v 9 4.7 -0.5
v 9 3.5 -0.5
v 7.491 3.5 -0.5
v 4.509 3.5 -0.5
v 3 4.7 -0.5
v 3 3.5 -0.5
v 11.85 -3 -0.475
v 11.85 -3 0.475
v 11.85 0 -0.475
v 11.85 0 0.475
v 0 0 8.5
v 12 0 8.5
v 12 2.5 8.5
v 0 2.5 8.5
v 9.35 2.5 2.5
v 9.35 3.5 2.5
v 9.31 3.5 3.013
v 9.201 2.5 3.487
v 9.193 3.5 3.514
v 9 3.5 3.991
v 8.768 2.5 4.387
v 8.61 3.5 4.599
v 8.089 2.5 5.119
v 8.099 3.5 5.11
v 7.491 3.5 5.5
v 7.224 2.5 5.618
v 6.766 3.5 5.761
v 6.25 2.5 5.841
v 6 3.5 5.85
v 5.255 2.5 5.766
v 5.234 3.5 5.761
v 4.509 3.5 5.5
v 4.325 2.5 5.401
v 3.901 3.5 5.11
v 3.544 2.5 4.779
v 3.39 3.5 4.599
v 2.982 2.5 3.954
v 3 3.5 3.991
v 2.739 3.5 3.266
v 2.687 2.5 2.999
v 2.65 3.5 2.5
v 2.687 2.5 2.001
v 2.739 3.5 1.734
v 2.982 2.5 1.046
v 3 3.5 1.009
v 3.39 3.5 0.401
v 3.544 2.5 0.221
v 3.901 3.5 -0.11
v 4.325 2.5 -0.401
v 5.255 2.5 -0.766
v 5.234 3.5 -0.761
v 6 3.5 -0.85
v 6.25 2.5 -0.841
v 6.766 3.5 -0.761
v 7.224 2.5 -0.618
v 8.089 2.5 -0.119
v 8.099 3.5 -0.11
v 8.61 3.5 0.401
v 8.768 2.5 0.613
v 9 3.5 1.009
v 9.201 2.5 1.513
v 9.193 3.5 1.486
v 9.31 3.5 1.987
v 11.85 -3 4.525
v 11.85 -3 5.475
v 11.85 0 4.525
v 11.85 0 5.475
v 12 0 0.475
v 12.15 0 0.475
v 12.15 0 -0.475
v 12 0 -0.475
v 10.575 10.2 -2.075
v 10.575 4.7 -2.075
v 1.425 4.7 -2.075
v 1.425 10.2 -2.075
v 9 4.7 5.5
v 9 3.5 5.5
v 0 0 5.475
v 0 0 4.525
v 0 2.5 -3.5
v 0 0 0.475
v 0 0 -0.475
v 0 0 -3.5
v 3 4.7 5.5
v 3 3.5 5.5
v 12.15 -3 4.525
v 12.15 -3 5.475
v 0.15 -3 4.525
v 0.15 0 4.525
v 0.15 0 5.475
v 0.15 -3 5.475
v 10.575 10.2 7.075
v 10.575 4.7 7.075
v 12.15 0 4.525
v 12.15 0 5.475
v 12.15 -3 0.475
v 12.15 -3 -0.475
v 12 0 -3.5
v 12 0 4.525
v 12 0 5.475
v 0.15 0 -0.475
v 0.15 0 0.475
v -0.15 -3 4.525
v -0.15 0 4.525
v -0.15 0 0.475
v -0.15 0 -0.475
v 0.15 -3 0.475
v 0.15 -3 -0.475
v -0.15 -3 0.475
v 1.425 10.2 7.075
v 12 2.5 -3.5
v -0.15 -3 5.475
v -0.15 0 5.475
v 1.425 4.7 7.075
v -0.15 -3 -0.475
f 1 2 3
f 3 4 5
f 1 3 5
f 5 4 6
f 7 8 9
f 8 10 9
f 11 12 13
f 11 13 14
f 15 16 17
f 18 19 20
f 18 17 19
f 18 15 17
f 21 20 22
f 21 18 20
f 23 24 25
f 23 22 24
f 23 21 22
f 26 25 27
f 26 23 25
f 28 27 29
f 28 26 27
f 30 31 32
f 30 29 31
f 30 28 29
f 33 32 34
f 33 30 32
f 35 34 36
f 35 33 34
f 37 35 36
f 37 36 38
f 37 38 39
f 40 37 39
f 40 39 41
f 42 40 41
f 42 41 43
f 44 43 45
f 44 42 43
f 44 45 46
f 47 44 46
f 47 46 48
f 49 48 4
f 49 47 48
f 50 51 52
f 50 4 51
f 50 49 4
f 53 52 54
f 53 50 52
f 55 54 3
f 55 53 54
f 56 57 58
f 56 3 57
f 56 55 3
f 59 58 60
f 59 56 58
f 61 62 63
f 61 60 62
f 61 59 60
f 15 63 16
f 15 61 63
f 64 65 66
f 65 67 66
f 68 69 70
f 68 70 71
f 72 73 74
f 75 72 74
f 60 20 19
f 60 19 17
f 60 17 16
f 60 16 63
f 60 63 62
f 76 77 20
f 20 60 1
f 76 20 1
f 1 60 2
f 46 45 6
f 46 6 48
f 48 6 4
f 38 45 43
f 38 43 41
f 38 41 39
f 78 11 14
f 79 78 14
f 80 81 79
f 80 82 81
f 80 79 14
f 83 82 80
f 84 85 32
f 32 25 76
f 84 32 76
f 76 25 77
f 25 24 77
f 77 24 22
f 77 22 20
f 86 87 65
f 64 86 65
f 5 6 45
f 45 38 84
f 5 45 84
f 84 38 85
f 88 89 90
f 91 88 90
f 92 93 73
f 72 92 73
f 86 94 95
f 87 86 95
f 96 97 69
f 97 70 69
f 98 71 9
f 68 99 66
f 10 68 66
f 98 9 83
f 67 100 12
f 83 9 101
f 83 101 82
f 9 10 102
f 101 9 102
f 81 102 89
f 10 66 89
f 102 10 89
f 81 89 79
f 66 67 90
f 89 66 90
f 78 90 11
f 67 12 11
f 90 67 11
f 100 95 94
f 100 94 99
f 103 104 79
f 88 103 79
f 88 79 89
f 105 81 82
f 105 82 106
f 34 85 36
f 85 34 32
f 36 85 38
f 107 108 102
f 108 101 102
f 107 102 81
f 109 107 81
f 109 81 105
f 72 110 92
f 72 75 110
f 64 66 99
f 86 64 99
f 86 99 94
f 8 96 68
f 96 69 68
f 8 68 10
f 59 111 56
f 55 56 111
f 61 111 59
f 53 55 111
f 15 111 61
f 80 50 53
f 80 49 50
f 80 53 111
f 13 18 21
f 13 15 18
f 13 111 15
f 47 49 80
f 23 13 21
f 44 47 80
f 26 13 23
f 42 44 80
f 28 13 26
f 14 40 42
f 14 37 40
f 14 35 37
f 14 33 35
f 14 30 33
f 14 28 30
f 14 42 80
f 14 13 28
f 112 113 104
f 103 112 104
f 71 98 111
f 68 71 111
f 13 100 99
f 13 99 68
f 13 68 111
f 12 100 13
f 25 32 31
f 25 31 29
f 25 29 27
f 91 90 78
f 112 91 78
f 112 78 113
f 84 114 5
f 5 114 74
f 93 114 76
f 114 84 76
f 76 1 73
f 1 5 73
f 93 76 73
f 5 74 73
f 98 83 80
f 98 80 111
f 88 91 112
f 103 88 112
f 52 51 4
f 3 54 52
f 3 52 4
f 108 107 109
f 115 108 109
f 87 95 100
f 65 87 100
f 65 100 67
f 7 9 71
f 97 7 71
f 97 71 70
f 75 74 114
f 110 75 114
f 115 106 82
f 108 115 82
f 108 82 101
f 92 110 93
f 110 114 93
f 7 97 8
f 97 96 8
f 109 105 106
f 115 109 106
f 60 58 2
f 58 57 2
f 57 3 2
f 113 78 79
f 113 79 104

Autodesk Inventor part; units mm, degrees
ref_plane "YZ Plane" through (0, 0, 0) normal (1, 0, 0) x (0, 1, 0)
ref_plane "XZ Plane" through (0, 0, 0) normal (0, 1, 0) x (-1, 0, 0)
ref_plane "XY Plane" through (0, 0, 0) normal (0, 0, 1) x (1, 0, 0)
sketch "Sketch1" plane through (0, 0, 0) normal (0, 1, 0) x (-1, 0, 0)
  line L0 (-0.15, 0.475) -> (0.15, 0.475)
  line L1 (0.15, 0.475) -> (0.15, -0.475)
  line L2 (0.15, -0.475) -> (-0.15, -0.475)
  line L3 (-0.15, -0.475) -> (-0.15, 0.475)
  line L4 (-0.15, 0.475) -> (0.15, -0.475) construction
  line L5 (0.15, 0.475) -> (-0.15, -0.475) construction
  line L6 (-0.15, 5.475) -> (0.15, 5.475)
  line L7 (0.15, 5.475) -> (0.15, 4.525)
  line L8 (0.15, 4.525) -> (-0.15, 4.525)
  line L9 (-0.15, 4.525) -> (-0.15, 5.475)
  line L10 (-0.15, 5.475) -> (0.15, 4.525) construction
  line L11 (0.15, 5.475) -> (-0.15, 4.525) construction
  line L12 (0, -1.665) -> (0, 6.665) construction
  line L13 (-14.61, 0) -> (2.61, 0) construction
  line L14 (-12.15, 0.475) -> (-11.85, 0.475)
  line L15 (-11.85, 0.475) -> (-11.85, -0.475)
  line L16 (-11.85, -0.475) -> (-12.15, -0.475)
  line L17 (-12.15, -0.475) -> (-12.15, 0.475)
  line L18 (-12.15, 0.475) -> (-11.85, -0.475) construction
  line L19 (-11.85, 0.475) -> (-12.15, -0.475) construction
  line L20 (-12.15, 5.475) -> (-11.85, 5.475)
  line L21 (-11.85, 5.475) -> (-11.85, 4.525)
  line L22 (-11.85, 4.525) -> (-12.15, 4.525)
  line L23 (-12.15, 4.525) -> (-12.15, 5.475)
  line L24 (-12.15, 5.475) -> (-11.85, 4.525) construction
  line L25 (-11.85, 5.475) -> (-12.15, 4.525) construction
  line L26 (-12, 0) -> (-12, 5) construction
  line L27 (-12, 5) -> (0, 5) construction
  point P0 (0, 0)
  point P1 (0, 5)
  point P2 (-12, 0)
  dimension "d0" = 0.95
  dimension "d1" = 0.3
  dimension "d2" = 0.95
  dimension "d3" = 0.3
  dimension "d4" = 5
  dimension "d5" = 0.95
  dimension "d6" = 0.3
  dimension "d7" = 12
  dimension "d8" = 0.95
  dimension "d9" = 0.3
extrude "Extrusion1" add sketch "Sketch1" against normal blind 3
sketch "Sketch2" plane through (0, 0, 0) normal (0, 1, 0) x (-1, 0, 0)
  line L0 (0, -3.5) -> (-12, -3.5)
  line L1 (-12, -3.5) -> (-12, 8.5)
  line L2 (-12, 8.5) -> (0, 8.5)
  line L3 (0, 8.5) -> (0, -3.5)
  line L4 (0, -3.5) -> (-12, 8.5) construction
  line L5 (0, 8.5) -> (-12, -3.5) construction
  line L6 (-12.15, 5.475) -> (-11.85, 5.475) construction
  line L7 (-12.15, 4.525) -> (-12.15, 5.475) construction
  line L8 (-11.85, 4.525) -> (-12.15, 4.525) construction
  line L9 (-11.85, 5.475) -> (-11.85, 4.525) construction
  line L10 (-11.85, 5.475) -> (-11.85, 4.525) construction
  line L11 (-11.85, 5) -> (-12.15, 5) construction
  point P0 (0, 0)
  point P1 (-6, 2.5)
  point P2 (-6, 2.5)
  dimension "d12" = 12
  dimension "d13" = 12
  dimension "d14" = 6
  dimension "d15" = 2.5
extrude "Extrusion2" add sketch "Sketch2" along normal blind 2.5
sketch "Sketch3" plane through (0, 2.5, 0) normal (0, 1, 0) x (1, 0, 0)
  line L0 (12, 3.5) -> (0, 3.5) construction
  line L1 (0, 3.5) -> (0, -8.5) construction
  line L2 (0, -8.5) -> (12, -8.5) construction
  line L3 (12, -8.5) -> (12, 3.5) construction
  line L4 (0, 3.5) -> (12, 3.5) construction
  line L5 (0, 3.5) -> (12, -8.5) construction
  line L6 (12, -8.5) -> (0, -8.5) construction
  line L7 (0, -8.5) -> (12, 3.5) construction
  circle A0 centre (6, -2.5) radius 3.35
  point P0 (0, 0)
  dimension "d18" = 6.7
extrude "Extrusion3" add sketch "Sketch3" along normal blind 1
sketch "Sketch4" plane through (6, 3.5, 2.5) normal (0, 1, 0) x (1, 0, 0)
  circle A0 centre (0, 0) radius 3.35 projected
  line L0 (-3, -3) -> (3, -3)
  line L1 (3, -3) -> (3, 3)
  line L2 (3, 3) -> (-3, 3)
  line L3 (-3, 3) -> (-3, -3)
  line L4 (-3, -3) -> (3, 3) construction
  line L5 (3, -3) -> (-3, 3) construction
  point P0 (-6, 2.5)
  dimension "d21" = 6
  dimension "d22" = 6
extrude "Extrusion4" add sketch "Sketch4" along normal blind 1.2 contours L1 A0 L0 L3 L2 | A0 L2 L1 | L1 L0 A0 | A0 L3 L2 | L0 L3 A0
sketch "Sketch5" plane through (6, 4.7, 2.5) normal (0, 1, 0) x (1, 0, 0)
  circle A0 centre (0, 0) radius 3.35 construction
  line L0 (6, 6) -> (-6, 6) construction
  line L1 (-6, 6) -> (-6, -6) construction
  line L2 (-6, -6) -> (6, -6) construction
  line L3 (6, -6) -> (6, 6) construction
  line L4 (-4.575, -4.575) -> (4.575, -4.575)
  line L5 (4.575, -4.575) -> (4.575, 4.575)
  line L6 (4.575, 4.575) -> (-4.575, 4.575)
  line L7 (-4.575, 4.575) -> (-4.575, -4.575)
  line L8 (-4.575, -4.575) -> (4.575, 4.575) construction
  line L9 (4.575, -4.575) -> (-4.575, 4.575) construction
  point P0 (-6, 2.5)
  dimension "d25" = 9.15
  dimension "d26" = 9.15
extrude "Extrusion5" add sketch "Sketch5" along normal blind 5.5
equation "\"d13\" = d12"
equation "\"d22\" = d21"
equation "\"d26\" = d25"
properties part number "NINIGI_TACTS-24N"
